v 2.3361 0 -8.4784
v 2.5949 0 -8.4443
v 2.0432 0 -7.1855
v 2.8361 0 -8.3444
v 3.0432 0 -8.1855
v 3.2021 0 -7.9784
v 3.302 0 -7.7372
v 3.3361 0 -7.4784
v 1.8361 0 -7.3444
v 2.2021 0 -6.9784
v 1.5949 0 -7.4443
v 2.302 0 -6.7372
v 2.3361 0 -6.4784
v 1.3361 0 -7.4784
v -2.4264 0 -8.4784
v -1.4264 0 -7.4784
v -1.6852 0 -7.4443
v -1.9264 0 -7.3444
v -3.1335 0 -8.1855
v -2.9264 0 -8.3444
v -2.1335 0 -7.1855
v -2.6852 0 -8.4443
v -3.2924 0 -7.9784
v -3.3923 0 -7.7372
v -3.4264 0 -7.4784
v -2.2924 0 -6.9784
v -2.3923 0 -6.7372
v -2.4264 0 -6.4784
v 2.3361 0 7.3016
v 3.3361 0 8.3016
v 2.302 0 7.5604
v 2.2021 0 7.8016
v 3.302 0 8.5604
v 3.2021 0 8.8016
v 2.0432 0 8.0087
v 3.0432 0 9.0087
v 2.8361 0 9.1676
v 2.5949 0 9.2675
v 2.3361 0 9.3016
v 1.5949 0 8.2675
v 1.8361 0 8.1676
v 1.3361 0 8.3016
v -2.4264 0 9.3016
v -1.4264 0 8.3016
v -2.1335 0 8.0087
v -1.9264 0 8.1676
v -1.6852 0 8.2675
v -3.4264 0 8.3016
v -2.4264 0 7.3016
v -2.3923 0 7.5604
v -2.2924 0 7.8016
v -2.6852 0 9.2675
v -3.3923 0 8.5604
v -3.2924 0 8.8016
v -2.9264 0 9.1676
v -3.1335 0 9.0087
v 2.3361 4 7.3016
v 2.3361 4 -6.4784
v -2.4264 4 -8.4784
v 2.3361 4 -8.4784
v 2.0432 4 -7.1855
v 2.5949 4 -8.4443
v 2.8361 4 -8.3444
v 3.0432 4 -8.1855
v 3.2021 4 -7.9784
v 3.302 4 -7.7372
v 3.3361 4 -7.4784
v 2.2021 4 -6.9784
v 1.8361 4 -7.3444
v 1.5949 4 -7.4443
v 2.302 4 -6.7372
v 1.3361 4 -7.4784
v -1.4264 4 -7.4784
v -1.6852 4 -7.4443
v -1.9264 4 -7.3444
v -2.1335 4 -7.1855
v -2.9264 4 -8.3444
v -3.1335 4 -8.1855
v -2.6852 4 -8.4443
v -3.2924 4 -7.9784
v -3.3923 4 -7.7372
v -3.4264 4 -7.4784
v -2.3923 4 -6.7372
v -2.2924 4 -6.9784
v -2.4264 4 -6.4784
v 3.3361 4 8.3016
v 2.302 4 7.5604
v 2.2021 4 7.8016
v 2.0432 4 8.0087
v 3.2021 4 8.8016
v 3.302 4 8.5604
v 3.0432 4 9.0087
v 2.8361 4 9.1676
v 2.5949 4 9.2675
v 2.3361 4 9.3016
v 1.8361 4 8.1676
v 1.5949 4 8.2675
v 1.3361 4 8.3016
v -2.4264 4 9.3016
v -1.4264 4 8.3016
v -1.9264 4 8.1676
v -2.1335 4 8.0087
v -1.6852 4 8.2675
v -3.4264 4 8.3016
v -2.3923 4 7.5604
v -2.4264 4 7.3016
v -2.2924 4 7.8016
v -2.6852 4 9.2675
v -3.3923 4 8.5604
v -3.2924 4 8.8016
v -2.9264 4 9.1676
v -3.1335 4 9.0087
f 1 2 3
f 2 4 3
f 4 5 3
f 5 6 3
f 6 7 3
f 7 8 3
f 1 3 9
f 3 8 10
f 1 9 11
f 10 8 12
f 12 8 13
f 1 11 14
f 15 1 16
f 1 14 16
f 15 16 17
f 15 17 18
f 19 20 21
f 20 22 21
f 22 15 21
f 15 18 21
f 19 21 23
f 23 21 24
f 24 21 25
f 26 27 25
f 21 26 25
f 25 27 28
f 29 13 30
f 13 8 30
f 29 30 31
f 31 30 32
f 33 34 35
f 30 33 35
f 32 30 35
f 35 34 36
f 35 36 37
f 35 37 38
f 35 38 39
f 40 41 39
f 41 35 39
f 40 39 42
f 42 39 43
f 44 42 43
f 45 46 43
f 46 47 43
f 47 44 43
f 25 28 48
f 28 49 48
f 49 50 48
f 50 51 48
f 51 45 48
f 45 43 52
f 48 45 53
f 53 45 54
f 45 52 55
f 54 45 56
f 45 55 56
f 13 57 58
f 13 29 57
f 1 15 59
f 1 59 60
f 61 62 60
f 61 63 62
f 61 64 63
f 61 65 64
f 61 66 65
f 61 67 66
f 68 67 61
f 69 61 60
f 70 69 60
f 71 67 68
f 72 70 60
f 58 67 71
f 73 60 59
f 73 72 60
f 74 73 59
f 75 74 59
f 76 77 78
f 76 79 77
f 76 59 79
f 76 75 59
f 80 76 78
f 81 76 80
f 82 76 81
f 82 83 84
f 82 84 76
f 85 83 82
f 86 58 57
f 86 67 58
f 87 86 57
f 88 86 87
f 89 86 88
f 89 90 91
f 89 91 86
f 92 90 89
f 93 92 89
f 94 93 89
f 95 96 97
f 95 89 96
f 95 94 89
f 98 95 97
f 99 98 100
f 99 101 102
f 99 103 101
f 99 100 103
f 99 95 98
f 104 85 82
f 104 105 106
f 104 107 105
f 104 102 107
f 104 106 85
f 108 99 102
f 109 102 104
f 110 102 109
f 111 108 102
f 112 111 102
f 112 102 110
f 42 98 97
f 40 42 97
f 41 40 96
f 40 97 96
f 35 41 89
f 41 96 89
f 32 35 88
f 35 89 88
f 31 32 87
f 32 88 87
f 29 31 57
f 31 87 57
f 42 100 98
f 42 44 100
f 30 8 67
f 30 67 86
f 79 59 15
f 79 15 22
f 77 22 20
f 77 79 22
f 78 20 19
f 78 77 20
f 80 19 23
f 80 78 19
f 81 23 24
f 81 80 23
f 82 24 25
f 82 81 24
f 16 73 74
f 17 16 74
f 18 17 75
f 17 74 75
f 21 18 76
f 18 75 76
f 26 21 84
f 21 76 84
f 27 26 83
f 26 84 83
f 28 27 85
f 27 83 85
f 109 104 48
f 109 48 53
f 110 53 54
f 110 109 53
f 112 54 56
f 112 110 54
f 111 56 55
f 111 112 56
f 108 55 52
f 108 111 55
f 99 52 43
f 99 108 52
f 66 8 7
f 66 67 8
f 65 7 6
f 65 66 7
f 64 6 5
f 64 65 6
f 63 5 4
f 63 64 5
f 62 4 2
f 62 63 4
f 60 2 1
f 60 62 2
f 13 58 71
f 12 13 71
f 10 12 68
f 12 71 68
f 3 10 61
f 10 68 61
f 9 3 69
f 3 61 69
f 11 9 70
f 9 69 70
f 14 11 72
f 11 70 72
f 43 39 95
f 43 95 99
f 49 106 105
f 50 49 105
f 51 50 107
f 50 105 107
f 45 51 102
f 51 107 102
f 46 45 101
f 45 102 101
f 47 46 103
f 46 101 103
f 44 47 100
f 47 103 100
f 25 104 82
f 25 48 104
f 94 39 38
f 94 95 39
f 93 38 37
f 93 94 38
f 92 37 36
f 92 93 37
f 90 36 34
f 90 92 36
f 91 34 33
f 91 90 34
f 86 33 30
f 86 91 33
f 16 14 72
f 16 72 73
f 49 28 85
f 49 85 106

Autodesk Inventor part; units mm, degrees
ref_plane "YZ Plane" through (0, 0, 0) normal (1, 0, 0) x (0, 1, 0)
ref_plane "XZ Plane" through (0, 0, 0) normal (0, 1, 0) x (-1, 0, 0)
ref_plane "XY Plane" through (0, 0, 0) normal (0, 0, 1) x (1, 0, 0)
sketch "Sketch1" plane through (0, 0, 0) normal (0, 1, 0) x (-1, 0, 0)
  line L0 (-3.3361, 9.3016) -> (3.4264, 9.3016)
  line L1 (3.4264, 9.3016) -> (3.4264, -8.4784)
  line L2 (3.4264, -8.4784) -> (-3.3361, -8.4784)
  line L3 (-3.3361, -8.4784) -> (-3.3361, 9.3016)
  line L4 (2.4264, -7.4784) -> (2.4264, 8.3016)
  line L5 (2.4264, 8.3016) -> (-2.3361, 8.3016)
  line L6 (-2.3361, 8.3016) -> (-2.3361, -7.4784)
  line L7 (-2.3361, -7.4784) -> (2.4264, -7.4784)
  point P0 (0, 0)
  dimension "d0" = 17.78
  dimension "d1" = 6.7625
  dimension "d2" = 1
extrude "Extrusion1" add sketch "Sketch1" along normal blind 4
fillet "Fillet1" radius 1 8 edges at (-3.4264, 2, 9.3016) (-3.4264, 2, -8.4784) (3.3361, 2, -8.4784) (3.3361, 2, 9.3016) (2.3361, 2, 8.3016) (-2.4264, 2, 8.3016) (-2.4264, 2, -7.4784) (2.3361, 2, -7.4784)
sketch "Sketch2" plane through (-2.4264, 0, -5.9384) normal (-1, 0, 0) x (0, 0, 1)
  circle A0 centre (0, 2) radius 2.54
  circle A1 centre (12.7, 2) radius 2.54
  line L0 (-1.54, 4) -> (14.24, 4) projected
  line L1 (15.24, 0) -> (15.24, 4) projected
  line L2 (15.24, 2) -> (-2.54, 2) construction
  line L3 (-2.54, 0) -> (-2.54, 4) projected
  dimension "d6" = 5.08
  dimension "d7" = 12.7
surface extrude "ExtrusionSrf1" sketch "Sketch2" along normal up to surface (1 mm away) shown yes curves A0
surface extrude "ExtrusionSrf2" sketch "Sketch2" along normal up to surface (1 mm away) shown yes curves A1
properties part number "ziptie" material "Acetal Resin, Black"
